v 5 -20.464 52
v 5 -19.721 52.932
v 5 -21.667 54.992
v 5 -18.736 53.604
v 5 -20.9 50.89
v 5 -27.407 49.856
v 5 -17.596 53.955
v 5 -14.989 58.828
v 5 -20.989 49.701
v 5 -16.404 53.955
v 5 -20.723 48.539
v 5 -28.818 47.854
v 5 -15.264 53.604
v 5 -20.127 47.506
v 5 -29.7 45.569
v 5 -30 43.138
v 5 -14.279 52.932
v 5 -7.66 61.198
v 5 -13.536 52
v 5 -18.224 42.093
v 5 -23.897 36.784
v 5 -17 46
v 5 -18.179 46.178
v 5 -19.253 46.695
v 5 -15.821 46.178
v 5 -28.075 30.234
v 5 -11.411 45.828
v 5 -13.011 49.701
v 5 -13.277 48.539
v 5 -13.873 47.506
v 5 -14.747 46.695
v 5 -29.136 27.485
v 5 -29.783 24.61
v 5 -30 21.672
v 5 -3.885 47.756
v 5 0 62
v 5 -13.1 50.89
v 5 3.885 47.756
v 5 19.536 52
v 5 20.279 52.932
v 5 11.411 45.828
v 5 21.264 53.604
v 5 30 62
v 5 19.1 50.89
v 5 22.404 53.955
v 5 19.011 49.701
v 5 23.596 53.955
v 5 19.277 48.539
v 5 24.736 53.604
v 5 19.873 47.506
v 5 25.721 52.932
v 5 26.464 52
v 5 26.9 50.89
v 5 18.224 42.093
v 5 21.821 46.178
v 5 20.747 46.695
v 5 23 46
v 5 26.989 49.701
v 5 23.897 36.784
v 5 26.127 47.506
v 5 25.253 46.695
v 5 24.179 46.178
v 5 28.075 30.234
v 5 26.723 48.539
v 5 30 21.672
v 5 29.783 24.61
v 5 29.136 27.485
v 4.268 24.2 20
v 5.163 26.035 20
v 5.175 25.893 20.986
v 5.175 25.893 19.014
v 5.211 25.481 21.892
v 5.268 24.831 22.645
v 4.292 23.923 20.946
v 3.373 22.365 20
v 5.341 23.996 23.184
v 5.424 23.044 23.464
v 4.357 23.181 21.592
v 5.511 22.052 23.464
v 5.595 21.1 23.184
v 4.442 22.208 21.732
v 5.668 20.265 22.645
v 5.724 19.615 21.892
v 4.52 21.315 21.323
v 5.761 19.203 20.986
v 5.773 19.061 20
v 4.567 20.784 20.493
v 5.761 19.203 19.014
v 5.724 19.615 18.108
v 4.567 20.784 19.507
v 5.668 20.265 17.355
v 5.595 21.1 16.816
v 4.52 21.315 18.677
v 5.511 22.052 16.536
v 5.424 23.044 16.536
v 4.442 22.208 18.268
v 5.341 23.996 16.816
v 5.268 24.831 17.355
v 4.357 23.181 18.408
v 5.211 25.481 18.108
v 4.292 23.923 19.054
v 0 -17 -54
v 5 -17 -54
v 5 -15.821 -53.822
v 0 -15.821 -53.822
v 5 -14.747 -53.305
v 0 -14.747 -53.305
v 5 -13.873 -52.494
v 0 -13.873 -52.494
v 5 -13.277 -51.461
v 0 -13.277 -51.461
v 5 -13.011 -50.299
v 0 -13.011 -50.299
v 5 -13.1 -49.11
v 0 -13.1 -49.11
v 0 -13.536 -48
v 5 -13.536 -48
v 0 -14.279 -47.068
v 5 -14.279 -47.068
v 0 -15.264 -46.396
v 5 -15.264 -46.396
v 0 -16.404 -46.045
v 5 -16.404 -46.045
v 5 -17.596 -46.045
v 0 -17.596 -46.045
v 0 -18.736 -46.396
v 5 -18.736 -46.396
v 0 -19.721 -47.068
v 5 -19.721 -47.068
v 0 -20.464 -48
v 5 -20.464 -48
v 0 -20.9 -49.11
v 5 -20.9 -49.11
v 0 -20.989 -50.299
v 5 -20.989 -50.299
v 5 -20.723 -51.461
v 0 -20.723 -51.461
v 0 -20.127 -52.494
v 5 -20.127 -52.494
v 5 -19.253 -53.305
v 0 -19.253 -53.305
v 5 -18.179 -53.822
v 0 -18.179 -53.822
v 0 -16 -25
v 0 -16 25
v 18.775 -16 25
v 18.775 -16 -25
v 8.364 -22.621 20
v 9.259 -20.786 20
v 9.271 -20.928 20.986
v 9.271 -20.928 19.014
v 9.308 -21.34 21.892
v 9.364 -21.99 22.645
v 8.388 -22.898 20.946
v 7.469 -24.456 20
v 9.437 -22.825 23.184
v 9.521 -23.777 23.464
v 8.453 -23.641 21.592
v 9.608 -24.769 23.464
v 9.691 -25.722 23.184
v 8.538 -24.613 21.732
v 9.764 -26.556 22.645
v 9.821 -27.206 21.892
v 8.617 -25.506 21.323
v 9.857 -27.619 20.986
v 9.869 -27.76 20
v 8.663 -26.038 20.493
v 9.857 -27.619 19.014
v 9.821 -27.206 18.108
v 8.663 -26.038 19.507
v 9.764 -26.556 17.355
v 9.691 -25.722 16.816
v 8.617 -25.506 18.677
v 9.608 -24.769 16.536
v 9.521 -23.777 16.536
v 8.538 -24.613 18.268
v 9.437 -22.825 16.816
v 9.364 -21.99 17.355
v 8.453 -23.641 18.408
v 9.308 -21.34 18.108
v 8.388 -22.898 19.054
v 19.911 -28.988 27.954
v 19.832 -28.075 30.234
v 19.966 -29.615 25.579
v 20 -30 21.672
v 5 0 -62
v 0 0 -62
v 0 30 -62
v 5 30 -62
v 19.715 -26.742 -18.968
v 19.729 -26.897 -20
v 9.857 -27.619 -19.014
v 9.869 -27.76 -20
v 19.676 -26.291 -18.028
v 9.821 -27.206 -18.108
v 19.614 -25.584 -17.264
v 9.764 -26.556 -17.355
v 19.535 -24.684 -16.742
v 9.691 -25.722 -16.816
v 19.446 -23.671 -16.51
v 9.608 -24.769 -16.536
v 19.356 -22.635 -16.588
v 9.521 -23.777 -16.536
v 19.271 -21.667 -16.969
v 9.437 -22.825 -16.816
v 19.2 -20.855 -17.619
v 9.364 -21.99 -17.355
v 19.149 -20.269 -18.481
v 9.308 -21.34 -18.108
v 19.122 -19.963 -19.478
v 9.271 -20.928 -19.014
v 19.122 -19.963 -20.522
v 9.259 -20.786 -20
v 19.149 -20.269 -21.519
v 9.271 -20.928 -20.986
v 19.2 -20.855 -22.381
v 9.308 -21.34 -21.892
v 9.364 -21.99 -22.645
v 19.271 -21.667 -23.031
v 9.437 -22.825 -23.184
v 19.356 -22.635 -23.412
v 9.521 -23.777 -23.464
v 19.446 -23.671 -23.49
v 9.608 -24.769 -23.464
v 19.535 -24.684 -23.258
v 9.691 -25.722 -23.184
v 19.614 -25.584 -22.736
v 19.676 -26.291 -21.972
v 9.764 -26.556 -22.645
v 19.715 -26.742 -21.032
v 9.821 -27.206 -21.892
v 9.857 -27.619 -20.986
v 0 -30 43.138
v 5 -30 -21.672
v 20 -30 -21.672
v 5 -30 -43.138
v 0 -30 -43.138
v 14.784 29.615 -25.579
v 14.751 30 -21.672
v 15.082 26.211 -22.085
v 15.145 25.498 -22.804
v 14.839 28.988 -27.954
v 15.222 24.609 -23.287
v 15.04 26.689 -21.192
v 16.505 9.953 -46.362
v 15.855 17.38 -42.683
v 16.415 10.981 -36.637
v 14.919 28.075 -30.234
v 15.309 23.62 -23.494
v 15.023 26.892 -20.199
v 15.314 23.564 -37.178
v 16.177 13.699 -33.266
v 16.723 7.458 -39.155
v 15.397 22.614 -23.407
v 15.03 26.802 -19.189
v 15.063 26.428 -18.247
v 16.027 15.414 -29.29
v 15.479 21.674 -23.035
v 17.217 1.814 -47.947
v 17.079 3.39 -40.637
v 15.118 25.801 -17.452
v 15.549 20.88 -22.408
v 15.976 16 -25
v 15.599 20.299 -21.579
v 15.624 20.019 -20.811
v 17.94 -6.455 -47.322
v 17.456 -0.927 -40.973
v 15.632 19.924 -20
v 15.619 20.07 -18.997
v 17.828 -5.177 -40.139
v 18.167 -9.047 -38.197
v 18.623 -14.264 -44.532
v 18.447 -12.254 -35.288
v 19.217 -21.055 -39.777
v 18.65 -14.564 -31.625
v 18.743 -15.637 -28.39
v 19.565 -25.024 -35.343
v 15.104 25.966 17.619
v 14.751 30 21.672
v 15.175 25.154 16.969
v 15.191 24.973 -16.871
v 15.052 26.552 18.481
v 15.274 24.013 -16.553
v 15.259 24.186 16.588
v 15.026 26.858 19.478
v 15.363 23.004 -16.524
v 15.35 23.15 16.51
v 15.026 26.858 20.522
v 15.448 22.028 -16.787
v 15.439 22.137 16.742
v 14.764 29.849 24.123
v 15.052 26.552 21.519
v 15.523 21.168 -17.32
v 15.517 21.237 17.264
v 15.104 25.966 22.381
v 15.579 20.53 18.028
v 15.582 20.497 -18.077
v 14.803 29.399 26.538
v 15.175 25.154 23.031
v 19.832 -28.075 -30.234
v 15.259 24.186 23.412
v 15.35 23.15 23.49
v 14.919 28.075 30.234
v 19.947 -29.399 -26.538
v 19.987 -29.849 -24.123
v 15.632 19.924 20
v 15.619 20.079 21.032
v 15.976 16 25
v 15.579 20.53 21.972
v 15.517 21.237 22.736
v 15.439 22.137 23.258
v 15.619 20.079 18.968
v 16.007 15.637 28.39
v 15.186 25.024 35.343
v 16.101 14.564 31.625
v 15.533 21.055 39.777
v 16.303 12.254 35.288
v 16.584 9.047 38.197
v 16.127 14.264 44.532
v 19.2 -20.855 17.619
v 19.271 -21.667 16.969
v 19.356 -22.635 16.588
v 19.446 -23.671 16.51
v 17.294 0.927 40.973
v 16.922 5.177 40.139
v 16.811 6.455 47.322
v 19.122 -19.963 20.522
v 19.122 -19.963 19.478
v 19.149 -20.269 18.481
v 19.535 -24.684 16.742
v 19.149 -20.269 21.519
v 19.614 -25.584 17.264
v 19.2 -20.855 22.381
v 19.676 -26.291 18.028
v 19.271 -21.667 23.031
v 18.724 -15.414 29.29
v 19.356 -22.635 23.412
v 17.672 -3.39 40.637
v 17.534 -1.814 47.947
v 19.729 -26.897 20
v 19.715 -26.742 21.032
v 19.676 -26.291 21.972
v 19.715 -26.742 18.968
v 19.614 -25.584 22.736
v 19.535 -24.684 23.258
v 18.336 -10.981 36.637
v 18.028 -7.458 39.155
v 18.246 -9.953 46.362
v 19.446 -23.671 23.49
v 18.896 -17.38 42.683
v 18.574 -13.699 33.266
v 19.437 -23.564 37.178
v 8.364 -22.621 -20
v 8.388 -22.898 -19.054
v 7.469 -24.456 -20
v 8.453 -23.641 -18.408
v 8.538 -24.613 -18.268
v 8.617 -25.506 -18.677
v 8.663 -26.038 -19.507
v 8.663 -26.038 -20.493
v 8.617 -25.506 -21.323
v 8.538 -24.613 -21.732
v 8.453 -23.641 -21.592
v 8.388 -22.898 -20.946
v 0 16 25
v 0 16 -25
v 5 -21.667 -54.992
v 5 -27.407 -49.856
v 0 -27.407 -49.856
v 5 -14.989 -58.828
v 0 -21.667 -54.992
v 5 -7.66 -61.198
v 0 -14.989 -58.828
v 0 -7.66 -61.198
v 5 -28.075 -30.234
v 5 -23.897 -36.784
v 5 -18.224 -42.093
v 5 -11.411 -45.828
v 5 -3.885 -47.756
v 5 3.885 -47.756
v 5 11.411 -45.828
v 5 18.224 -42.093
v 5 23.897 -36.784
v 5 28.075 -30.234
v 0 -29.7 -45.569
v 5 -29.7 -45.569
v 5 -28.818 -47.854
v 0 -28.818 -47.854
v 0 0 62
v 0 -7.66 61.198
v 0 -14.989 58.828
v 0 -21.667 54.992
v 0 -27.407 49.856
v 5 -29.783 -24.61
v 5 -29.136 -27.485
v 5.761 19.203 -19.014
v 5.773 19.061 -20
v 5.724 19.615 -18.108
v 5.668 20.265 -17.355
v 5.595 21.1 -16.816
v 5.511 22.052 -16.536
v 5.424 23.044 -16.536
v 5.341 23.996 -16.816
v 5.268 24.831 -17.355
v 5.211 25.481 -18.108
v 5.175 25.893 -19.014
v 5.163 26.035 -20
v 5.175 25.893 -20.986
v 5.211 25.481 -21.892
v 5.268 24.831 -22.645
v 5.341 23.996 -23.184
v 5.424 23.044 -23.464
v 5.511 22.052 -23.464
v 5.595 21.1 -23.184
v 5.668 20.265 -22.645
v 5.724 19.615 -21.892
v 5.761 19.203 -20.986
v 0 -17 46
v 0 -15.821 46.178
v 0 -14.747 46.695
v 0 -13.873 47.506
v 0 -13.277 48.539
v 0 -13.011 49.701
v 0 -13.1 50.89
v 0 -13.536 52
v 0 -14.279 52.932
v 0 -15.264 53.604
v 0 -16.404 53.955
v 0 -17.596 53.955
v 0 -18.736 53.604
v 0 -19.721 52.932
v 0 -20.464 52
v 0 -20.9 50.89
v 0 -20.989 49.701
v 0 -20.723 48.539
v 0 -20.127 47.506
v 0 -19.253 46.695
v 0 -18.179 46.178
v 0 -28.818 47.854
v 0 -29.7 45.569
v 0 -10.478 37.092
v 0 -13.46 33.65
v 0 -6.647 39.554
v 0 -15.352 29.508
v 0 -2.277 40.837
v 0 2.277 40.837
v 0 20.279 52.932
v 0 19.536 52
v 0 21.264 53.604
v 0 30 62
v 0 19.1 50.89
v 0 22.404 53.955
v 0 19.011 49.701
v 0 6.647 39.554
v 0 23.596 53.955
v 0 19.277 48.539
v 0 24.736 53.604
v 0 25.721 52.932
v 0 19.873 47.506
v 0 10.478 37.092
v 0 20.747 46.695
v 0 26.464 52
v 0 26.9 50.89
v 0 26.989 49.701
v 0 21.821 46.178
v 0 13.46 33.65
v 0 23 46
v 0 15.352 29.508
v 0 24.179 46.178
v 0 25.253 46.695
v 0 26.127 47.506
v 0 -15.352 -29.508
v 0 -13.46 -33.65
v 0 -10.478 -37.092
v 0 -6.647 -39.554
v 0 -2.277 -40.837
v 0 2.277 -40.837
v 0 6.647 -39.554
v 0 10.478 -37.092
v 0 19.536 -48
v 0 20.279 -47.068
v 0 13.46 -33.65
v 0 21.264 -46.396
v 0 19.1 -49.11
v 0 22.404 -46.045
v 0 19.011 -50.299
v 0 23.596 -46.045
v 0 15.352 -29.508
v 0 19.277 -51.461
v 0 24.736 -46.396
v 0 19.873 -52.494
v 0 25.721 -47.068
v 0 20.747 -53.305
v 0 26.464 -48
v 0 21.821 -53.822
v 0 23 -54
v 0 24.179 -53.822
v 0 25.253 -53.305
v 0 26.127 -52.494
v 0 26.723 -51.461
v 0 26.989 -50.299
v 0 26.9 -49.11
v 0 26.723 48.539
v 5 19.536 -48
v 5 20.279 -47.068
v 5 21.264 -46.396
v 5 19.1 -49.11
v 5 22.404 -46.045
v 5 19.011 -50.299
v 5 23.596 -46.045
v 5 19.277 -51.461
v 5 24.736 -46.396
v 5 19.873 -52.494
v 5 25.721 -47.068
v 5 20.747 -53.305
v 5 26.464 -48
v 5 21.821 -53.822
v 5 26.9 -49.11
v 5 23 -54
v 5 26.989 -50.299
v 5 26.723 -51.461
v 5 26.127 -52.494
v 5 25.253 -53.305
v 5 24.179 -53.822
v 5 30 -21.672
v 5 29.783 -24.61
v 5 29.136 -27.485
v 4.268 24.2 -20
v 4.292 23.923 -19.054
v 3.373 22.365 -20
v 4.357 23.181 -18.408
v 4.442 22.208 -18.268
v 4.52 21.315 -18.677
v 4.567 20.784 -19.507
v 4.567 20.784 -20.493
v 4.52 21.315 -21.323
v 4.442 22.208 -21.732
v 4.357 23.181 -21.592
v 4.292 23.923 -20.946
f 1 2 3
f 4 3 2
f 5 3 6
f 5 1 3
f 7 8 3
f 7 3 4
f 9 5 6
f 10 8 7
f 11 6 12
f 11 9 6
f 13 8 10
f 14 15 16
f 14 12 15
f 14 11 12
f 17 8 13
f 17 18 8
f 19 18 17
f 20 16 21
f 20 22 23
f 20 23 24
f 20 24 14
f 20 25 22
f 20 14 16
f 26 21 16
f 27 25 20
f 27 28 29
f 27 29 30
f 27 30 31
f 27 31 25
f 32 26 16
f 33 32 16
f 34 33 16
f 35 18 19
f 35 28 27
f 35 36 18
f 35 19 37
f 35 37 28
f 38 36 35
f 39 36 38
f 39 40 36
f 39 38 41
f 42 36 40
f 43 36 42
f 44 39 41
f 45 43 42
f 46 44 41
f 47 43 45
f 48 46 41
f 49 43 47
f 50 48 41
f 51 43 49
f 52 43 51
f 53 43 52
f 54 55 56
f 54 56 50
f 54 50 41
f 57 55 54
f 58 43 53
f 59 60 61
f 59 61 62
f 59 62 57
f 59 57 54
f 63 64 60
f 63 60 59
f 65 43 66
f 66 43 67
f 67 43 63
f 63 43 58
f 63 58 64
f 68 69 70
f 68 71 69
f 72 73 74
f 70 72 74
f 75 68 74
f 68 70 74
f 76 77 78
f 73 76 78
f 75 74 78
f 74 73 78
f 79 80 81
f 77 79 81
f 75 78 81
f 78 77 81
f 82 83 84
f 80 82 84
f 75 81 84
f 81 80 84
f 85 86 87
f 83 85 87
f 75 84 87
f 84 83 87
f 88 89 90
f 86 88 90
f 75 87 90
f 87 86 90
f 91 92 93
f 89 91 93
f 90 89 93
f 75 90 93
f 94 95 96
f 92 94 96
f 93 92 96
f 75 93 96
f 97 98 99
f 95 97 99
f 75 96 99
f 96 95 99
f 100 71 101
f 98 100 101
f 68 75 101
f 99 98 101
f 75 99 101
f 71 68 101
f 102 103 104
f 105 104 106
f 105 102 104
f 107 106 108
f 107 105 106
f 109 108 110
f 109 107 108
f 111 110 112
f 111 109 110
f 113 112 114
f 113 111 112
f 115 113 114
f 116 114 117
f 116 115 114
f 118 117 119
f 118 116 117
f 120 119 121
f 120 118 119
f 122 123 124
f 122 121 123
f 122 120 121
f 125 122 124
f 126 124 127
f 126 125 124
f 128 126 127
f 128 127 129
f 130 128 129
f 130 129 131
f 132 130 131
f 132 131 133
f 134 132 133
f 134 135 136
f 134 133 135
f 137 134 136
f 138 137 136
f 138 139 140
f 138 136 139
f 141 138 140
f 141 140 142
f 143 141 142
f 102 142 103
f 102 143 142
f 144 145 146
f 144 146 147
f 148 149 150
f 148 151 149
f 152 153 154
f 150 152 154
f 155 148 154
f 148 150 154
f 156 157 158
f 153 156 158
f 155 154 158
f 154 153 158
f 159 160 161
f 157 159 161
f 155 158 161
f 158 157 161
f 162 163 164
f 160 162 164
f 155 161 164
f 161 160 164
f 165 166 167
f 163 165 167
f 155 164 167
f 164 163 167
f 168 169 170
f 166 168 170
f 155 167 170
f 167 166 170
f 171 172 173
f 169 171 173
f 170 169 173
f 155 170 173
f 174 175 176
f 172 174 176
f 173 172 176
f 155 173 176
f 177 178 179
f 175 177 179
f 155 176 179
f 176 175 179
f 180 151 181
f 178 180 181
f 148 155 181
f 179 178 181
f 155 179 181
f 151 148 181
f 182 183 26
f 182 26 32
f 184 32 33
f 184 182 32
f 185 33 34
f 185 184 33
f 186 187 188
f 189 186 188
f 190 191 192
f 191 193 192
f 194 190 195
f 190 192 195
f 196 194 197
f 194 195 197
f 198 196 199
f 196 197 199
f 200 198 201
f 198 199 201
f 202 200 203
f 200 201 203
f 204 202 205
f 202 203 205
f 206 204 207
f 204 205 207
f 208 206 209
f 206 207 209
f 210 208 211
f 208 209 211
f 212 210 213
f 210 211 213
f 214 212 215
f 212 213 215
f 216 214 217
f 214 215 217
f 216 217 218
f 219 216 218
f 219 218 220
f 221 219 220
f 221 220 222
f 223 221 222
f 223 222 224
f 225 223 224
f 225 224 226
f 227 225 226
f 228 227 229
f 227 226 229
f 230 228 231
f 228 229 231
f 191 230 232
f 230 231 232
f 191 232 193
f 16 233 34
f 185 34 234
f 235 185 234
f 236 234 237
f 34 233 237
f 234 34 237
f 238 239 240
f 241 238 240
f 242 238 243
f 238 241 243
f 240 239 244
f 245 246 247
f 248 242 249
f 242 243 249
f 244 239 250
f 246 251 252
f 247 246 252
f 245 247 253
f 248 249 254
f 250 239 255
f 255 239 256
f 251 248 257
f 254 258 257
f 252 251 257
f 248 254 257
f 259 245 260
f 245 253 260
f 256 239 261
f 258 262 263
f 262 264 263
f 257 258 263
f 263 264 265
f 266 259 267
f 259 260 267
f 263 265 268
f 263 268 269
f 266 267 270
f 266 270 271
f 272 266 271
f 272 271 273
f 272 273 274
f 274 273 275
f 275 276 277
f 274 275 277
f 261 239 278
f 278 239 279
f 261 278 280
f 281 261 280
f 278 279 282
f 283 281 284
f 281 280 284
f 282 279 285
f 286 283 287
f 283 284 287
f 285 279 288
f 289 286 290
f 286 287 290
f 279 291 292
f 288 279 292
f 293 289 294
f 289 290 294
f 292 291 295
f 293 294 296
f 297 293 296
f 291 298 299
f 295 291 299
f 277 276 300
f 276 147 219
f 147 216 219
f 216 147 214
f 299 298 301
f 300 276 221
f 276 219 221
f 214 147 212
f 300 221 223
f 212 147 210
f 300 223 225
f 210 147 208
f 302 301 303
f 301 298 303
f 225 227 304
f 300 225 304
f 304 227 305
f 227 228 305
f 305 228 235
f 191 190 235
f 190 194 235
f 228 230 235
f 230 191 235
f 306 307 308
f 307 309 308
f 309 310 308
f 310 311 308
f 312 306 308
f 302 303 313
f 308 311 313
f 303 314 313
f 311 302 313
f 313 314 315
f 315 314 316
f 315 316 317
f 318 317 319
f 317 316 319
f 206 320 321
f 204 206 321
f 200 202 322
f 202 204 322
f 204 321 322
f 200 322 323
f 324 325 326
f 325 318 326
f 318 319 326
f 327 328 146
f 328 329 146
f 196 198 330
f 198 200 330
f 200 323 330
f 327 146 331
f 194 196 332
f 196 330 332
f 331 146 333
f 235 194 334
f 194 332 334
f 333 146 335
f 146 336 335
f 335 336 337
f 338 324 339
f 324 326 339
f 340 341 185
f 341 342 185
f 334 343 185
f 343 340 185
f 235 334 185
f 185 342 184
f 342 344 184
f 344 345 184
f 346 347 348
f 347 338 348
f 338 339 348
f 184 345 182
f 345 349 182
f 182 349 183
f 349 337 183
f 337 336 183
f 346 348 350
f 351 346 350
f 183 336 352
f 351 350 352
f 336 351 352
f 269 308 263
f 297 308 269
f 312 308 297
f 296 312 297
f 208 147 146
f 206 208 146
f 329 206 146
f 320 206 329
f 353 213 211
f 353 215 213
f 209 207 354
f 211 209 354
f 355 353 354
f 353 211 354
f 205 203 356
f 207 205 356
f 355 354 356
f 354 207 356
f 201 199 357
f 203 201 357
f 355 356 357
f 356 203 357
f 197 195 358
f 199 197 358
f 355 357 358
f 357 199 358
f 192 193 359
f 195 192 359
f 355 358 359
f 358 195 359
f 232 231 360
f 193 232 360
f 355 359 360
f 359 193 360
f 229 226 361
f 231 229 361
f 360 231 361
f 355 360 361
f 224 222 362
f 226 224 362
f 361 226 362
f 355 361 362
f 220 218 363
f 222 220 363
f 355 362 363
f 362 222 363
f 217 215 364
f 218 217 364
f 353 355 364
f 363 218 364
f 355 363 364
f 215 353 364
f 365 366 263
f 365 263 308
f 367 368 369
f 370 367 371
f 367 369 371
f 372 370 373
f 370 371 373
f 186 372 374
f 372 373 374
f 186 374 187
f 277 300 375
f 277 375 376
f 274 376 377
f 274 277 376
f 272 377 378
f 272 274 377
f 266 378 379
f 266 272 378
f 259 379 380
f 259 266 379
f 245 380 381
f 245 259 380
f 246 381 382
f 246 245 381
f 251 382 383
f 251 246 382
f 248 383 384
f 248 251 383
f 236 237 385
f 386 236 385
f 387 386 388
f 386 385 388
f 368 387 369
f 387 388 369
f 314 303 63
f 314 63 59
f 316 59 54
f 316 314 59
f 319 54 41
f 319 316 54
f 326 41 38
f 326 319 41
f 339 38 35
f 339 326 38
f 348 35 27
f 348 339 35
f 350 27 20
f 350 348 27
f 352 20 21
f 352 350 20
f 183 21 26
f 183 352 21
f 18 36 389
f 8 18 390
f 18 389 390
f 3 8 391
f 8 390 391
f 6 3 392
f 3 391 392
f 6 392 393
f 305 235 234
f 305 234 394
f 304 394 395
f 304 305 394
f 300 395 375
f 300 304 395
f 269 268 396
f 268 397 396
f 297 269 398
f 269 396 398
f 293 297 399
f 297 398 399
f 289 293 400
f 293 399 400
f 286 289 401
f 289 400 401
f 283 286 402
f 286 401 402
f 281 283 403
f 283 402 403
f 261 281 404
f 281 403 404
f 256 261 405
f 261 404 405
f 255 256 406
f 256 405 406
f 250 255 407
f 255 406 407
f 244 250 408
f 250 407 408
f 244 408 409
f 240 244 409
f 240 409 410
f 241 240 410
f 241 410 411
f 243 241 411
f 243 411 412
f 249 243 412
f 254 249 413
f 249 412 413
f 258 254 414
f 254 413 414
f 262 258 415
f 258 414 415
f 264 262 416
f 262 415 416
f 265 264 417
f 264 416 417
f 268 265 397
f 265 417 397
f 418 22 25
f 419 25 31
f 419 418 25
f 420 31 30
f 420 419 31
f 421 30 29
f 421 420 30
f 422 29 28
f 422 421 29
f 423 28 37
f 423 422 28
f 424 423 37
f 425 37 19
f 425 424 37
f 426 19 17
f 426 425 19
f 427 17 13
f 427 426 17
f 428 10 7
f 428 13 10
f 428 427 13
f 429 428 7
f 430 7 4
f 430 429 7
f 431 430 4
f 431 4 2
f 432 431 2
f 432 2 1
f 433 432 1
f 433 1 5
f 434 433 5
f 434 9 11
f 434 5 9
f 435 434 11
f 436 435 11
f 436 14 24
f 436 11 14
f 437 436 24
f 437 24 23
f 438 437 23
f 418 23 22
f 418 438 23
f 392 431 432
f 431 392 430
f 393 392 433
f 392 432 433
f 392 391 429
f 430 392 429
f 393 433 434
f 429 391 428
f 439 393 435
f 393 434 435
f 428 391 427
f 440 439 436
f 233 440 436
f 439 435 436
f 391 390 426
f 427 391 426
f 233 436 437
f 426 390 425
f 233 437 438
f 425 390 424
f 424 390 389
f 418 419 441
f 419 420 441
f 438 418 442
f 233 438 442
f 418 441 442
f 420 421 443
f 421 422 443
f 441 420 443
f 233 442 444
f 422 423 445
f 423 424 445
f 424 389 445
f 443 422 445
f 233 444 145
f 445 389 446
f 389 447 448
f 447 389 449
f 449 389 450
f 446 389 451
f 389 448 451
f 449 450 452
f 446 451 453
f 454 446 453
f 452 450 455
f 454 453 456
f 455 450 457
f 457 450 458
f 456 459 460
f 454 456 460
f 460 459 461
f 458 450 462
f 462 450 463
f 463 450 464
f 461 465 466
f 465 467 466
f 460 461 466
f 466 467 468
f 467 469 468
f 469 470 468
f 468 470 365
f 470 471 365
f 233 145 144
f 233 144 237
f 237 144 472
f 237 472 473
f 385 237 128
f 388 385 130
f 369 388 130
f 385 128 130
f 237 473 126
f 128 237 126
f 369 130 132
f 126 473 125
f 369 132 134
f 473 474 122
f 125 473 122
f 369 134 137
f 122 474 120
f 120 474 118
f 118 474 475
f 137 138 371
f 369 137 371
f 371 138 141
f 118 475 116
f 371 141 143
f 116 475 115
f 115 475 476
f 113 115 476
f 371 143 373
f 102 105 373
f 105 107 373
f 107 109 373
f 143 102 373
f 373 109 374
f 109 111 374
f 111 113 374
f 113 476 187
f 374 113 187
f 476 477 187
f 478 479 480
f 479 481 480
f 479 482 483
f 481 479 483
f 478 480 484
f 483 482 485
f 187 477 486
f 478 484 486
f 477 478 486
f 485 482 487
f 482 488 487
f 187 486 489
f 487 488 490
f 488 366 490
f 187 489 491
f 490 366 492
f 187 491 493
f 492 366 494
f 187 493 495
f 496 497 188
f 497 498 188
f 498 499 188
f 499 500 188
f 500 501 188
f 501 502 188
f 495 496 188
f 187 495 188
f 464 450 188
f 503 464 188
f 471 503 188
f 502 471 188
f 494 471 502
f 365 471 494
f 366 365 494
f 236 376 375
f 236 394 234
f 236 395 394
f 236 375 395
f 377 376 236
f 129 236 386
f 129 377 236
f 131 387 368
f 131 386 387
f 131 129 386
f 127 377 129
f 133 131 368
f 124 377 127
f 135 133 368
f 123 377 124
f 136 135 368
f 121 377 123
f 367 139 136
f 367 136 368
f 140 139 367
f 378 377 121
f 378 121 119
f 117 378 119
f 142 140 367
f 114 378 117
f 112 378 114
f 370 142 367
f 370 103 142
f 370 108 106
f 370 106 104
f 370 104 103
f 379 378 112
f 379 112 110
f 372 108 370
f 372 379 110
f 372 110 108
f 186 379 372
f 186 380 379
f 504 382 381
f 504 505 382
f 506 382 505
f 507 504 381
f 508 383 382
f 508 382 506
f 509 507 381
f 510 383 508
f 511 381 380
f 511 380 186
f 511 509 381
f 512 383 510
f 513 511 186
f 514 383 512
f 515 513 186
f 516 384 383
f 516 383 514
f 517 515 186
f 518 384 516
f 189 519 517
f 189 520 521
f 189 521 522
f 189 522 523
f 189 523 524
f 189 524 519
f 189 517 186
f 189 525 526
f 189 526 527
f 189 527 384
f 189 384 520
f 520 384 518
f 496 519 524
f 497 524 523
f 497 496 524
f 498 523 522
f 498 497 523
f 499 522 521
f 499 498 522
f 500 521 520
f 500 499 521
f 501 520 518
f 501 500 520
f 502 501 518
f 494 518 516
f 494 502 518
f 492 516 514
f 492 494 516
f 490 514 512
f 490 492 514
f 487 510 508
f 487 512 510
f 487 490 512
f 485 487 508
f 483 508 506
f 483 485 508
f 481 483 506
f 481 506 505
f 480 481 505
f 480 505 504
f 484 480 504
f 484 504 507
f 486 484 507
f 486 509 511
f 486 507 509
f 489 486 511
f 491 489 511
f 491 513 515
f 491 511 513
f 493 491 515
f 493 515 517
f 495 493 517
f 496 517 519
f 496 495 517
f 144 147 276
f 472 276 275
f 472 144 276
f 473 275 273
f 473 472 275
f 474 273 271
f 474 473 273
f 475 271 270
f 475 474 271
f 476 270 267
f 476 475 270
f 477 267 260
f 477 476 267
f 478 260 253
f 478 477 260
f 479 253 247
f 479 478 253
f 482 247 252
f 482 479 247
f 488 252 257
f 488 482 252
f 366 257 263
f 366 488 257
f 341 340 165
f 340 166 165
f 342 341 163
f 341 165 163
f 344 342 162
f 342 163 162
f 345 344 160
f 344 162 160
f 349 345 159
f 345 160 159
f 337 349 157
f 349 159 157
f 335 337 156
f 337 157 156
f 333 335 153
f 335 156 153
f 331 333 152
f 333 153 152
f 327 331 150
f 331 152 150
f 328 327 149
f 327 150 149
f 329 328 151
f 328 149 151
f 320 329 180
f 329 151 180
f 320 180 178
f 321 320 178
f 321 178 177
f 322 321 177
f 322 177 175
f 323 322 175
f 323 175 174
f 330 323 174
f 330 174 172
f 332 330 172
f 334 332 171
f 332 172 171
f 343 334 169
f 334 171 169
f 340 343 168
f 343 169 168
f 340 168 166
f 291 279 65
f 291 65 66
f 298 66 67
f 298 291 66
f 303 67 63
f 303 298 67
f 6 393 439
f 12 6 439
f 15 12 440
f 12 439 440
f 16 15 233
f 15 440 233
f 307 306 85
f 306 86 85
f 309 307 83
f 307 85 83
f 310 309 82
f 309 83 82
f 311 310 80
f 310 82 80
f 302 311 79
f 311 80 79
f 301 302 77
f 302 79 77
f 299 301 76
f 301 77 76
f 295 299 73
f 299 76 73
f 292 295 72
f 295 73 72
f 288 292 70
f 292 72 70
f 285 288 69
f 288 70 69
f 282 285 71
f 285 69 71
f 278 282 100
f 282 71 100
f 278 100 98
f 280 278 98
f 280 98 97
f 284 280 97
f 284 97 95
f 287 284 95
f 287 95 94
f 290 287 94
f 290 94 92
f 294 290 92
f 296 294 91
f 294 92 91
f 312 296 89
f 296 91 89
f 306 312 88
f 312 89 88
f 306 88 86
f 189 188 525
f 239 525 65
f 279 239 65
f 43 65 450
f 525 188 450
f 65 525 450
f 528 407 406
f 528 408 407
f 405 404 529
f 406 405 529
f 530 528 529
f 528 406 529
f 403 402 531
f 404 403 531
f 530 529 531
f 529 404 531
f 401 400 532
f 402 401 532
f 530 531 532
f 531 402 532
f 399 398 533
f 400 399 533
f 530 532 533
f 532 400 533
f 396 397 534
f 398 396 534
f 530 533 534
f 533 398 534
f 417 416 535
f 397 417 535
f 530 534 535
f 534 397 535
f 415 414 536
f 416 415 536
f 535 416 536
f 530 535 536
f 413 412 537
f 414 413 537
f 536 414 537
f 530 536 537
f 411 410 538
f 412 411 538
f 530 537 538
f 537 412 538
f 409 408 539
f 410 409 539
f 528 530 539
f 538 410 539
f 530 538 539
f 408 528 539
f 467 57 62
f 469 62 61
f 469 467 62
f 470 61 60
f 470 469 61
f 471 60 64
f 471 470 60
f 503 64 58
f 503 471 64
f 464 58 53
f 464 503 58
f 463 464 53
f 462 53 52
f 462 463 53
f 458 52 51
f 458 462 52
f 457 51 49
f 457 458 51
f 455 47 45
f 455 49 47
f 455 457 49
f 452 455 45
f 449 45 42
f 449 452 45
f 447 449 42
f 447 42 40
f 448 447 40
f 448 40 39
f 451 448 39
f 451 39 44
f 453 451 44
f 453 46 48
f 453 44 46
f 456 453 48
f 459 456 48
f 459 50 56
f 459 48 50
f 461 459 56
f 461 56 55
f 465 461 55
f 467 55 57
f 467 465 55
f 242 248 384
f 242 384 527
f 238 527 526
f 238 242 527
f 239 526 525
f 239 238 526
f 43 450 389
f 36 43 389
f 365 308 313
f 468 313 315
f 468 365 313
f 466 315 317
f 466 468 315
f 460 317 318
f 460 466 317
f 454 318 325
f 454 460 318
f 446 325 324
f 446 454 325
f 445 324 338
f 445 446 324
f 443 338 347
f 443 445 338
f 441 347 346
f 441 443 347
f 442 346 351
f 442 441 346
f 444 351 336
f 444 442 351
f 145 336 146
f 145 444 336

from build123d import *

# Parameters (mm, degrees)
SZKIC1_R                                 = 4
DODANIE_WYCI_GNI_CIE1_DEPTH              = 20
SZKIC2_OUTSIDE_W                         = 153.84
SZKIC2_OUTSIDE_H                         = 89.84
WYTNIJ_WYCI_GNI_CIE1_DEPTH               = 15
WYTNIJ_WYCI_GNI_CIE2_DEPTH               = 130.135587659
WYTNIJ_WYCI_GNI_CIE2_DEPTH_BACK          = 130.135587659
OTW_R_GWINTOWANY_M8X1_01_D               = 7
OTW_R_GWINTOWANY_M8X1_01_DEPTH           = 9.896987833
OTW_R_GWINTOWANY_M8X1_01_TIP             = 2.103012167
OTW_R_GWINTOWANY_M8X1_01_ON_FACE_2_D     = 7
OTW_R_GWINTOWANY_M8X1_01_ON_FACE_2_DEPTH = 9.896987833
OTW_R_GWINTOWANY_M8X1_01_ON_FACE_2_TIP   = 2.103012167


with BuildPart() as part:
    # Szkic1 → Dodanie-wyciągnięcie1 (new body)
    with BuildSketch(Plane(origin=(0, 0, 0), x_dir=(0, 0, -1), z_dir=(1, 0, 0))):
        with BuildLine():
            Line((-43.138357147, -30), (43.138357147, -30))
            ThreePointArc((43.138357147, -30), (46.738768646, -29.329364235), (49.856267202, -27.407407407))
            ThreePointArc((49.856267202, -27.407407407), (58.828108774, -14.988630917), (62, 0))
            Line((62, 0), (62, 30))
            Line((62, 30), (-62, 30))
            Line((-62, 30), (-62, 0))
            ThreePointArc((-62, 0), (-58.828108774, -14.988630917), (-49.856267202, -27.407407407))
            ThreePointArc((-49.856267202, -27.407407407), (-46.738768646, -29.329364235), (-43.138357147, -30))
        make_face()
        with Locations((-50, 23)):
            Circle(SZKIC1_R, mode=Mode.SUBTRACT)
        with Locations((50, 23)):
            Circle(SZKIC1_R, mode=Mode.SUBTRACT)
        with Locations((50, -17)):
            Circle(SZKIC1_R, mode=Mode.SUBTRACT)
        with Locations((-50, -17)):
            Circle(SZKIC1_R, mode=Mode.SUBTRACT)
        with BuildLine():
            Line((-25, -16), (25, -16))
            ThreePointArc((25, -16), (41, 0), (25, 16))
            Line((25, 16), (-25, 16))
            ThreePointArc((-25, 16), (-41, 0), (-25, -16))
        make_face(mode=Mode.SUBTRACT)
    extrude(amount=DODANIE_WYCI_GNI_CIE1_DEPTH)

    # Szkic2 outside → Wytnij-wyciągnięcie1 (cut)
    # profile 1 of 2: a face of its own
    with BuildSketch(Plane(origin=(20, 0, 0), x_dir=(0, 0, -1), z_dir=(1, 0, 0))):
        Rectangle(SZKIC2_OUTSIDE_W, SZKIC2_OUTSIDE_H)
        with BuildLine():
            Line((21.671768561, 30), (-21.671768561, 30))
            ThreePointArc((-21.671768561, 30), (-26.059642547, 29.512728202), (-30.233707808, 28.074656189))
            ThreePointArc((-30.233707808, 28.074656189), (-48, 0), (-30.233707808, -28.074656189))
            ThreePointArc((-30.233707808, -28.074656189), (-26.059642547, -29.512728202), (-21.671768561, -30))
            Line((-21.671768561, -30), (21.671768561, -30))
            ThreePointArc((21.671768561, -30), (26.059642547, -29.512728202), (30.233707808, -28.074656189))
            ThreePointArc((30.233707808, -28.074656189), (48, 0), (30.233707808, 28.074656189))
            ThreePointArc((30.233707808, 28.074656189), (26.059642547, 29.512728202), (21.671768561, 30))
        make_face(mode=Mode.SUBTRACT)
    # profile 2 of 2: a face of its own
    with BuildSketch(Plane(origin=(20, 0, 0), x_dir=(0, 0, -1), z_dir=(1, 0, 0))):
        with BuildLine():
            Line((-25, -16), (25, -16))
            ThreePointArc((25, -16), (41, 0), (25, 16))
            Line((25, 16), (-25, 16))
            ThreePointArc((-25, 16), (-41, 0), (-25, -16))
        make_face()
    extrude(amount=-WYTNIJ_WYCI_GNI_CIE1_DEPTH, mode=Mode.SUBTRACT)

    # Szkic3 → Wytnij-wyciągnięcie2 (cut, two sides: drawn at the far end of the back side and taken through both)
    with BuildSketch(Plane(origin=(0, 0, -62), x_dir=(-1, 0, 0), z_dir=(0, 0, -1)).offset(-WYTNIJ_WYCI_GNI_CIE2_DEPTH_BACK)):
        Polygon((-20, -30), (-20, 30), (-14.750680188, 30), align=None)
    extrude(amount=WYTNIJ_WYCI_GNI_CIE2_DEPTH + WYTNIJ_WYCI_GNI_CIE2_DEPTH_BACK, mode=Mode.SUBTRACT)

    # Otwór gwintowany M8x1.01
    with Locations(Plane(origin=(15.32718014, 23.410575405, 20), x_dir=(-0.087155742748, 0.996194698092, 0), z_dir=(0.996194698092, 0.087155742748, 0))):
        with Locations((0, 0), (-47, -40), (-47, 0)):
            Hole(OTW_R_GWINTOWANY_M8X1_01_D / 2, depth=OTW_R_GWINTOWANY_M8X1_01_DEPTH)
            with Locations((0, 0, -(OTW_R_GWINTOWANY_M8X1_01_DEPTH + OTW_R_GWINTOWANY_M8X1_01_TIP / 2))):  # 118° drill point
                Cone(0, OTW_R_GWINTOWANY_M8X1_01_D / 2, OTW_R_GWINTOWANY_M8X1_01_TIP, mode=Mode.SUBTRACT)

    # Otwór gwintowany M8x1.01 on face 2
    with Locations(Plane(origin=(15.32718014, 23.410575405, -20), x_dir=(-0.087155971833, 0.996194678049, 0), z_dir=(0.996194678049, 0.087155971833, 0))):
        with Locations((0, 0)):
            Hole(OTW_R_GWINTOWANY_M8X1_01_ON_FACE_2_D / 2, depth=OTW_R_GWINTOWANY_M8X1_01_ON_FACE_2_DEPTH)
            with Locations((0, 0, -(OTW_R_GWINTOWANY_M8X1_01_ON_FACE_2_DEPTH + OTW_R_GWINTOWANY_M8X1_01_ON_FACE_2_TIP / 2))):  # 118° drill point
                Cone(0, OTW_R_GWINTOWANY_M8X1_01_ON_FACE_2_D / 2, OTW_R_GWINTOWANY_M8X1_01_ON_FACE_2_TIP, mode=Mode.SUBTRACT)


solid = part.part
